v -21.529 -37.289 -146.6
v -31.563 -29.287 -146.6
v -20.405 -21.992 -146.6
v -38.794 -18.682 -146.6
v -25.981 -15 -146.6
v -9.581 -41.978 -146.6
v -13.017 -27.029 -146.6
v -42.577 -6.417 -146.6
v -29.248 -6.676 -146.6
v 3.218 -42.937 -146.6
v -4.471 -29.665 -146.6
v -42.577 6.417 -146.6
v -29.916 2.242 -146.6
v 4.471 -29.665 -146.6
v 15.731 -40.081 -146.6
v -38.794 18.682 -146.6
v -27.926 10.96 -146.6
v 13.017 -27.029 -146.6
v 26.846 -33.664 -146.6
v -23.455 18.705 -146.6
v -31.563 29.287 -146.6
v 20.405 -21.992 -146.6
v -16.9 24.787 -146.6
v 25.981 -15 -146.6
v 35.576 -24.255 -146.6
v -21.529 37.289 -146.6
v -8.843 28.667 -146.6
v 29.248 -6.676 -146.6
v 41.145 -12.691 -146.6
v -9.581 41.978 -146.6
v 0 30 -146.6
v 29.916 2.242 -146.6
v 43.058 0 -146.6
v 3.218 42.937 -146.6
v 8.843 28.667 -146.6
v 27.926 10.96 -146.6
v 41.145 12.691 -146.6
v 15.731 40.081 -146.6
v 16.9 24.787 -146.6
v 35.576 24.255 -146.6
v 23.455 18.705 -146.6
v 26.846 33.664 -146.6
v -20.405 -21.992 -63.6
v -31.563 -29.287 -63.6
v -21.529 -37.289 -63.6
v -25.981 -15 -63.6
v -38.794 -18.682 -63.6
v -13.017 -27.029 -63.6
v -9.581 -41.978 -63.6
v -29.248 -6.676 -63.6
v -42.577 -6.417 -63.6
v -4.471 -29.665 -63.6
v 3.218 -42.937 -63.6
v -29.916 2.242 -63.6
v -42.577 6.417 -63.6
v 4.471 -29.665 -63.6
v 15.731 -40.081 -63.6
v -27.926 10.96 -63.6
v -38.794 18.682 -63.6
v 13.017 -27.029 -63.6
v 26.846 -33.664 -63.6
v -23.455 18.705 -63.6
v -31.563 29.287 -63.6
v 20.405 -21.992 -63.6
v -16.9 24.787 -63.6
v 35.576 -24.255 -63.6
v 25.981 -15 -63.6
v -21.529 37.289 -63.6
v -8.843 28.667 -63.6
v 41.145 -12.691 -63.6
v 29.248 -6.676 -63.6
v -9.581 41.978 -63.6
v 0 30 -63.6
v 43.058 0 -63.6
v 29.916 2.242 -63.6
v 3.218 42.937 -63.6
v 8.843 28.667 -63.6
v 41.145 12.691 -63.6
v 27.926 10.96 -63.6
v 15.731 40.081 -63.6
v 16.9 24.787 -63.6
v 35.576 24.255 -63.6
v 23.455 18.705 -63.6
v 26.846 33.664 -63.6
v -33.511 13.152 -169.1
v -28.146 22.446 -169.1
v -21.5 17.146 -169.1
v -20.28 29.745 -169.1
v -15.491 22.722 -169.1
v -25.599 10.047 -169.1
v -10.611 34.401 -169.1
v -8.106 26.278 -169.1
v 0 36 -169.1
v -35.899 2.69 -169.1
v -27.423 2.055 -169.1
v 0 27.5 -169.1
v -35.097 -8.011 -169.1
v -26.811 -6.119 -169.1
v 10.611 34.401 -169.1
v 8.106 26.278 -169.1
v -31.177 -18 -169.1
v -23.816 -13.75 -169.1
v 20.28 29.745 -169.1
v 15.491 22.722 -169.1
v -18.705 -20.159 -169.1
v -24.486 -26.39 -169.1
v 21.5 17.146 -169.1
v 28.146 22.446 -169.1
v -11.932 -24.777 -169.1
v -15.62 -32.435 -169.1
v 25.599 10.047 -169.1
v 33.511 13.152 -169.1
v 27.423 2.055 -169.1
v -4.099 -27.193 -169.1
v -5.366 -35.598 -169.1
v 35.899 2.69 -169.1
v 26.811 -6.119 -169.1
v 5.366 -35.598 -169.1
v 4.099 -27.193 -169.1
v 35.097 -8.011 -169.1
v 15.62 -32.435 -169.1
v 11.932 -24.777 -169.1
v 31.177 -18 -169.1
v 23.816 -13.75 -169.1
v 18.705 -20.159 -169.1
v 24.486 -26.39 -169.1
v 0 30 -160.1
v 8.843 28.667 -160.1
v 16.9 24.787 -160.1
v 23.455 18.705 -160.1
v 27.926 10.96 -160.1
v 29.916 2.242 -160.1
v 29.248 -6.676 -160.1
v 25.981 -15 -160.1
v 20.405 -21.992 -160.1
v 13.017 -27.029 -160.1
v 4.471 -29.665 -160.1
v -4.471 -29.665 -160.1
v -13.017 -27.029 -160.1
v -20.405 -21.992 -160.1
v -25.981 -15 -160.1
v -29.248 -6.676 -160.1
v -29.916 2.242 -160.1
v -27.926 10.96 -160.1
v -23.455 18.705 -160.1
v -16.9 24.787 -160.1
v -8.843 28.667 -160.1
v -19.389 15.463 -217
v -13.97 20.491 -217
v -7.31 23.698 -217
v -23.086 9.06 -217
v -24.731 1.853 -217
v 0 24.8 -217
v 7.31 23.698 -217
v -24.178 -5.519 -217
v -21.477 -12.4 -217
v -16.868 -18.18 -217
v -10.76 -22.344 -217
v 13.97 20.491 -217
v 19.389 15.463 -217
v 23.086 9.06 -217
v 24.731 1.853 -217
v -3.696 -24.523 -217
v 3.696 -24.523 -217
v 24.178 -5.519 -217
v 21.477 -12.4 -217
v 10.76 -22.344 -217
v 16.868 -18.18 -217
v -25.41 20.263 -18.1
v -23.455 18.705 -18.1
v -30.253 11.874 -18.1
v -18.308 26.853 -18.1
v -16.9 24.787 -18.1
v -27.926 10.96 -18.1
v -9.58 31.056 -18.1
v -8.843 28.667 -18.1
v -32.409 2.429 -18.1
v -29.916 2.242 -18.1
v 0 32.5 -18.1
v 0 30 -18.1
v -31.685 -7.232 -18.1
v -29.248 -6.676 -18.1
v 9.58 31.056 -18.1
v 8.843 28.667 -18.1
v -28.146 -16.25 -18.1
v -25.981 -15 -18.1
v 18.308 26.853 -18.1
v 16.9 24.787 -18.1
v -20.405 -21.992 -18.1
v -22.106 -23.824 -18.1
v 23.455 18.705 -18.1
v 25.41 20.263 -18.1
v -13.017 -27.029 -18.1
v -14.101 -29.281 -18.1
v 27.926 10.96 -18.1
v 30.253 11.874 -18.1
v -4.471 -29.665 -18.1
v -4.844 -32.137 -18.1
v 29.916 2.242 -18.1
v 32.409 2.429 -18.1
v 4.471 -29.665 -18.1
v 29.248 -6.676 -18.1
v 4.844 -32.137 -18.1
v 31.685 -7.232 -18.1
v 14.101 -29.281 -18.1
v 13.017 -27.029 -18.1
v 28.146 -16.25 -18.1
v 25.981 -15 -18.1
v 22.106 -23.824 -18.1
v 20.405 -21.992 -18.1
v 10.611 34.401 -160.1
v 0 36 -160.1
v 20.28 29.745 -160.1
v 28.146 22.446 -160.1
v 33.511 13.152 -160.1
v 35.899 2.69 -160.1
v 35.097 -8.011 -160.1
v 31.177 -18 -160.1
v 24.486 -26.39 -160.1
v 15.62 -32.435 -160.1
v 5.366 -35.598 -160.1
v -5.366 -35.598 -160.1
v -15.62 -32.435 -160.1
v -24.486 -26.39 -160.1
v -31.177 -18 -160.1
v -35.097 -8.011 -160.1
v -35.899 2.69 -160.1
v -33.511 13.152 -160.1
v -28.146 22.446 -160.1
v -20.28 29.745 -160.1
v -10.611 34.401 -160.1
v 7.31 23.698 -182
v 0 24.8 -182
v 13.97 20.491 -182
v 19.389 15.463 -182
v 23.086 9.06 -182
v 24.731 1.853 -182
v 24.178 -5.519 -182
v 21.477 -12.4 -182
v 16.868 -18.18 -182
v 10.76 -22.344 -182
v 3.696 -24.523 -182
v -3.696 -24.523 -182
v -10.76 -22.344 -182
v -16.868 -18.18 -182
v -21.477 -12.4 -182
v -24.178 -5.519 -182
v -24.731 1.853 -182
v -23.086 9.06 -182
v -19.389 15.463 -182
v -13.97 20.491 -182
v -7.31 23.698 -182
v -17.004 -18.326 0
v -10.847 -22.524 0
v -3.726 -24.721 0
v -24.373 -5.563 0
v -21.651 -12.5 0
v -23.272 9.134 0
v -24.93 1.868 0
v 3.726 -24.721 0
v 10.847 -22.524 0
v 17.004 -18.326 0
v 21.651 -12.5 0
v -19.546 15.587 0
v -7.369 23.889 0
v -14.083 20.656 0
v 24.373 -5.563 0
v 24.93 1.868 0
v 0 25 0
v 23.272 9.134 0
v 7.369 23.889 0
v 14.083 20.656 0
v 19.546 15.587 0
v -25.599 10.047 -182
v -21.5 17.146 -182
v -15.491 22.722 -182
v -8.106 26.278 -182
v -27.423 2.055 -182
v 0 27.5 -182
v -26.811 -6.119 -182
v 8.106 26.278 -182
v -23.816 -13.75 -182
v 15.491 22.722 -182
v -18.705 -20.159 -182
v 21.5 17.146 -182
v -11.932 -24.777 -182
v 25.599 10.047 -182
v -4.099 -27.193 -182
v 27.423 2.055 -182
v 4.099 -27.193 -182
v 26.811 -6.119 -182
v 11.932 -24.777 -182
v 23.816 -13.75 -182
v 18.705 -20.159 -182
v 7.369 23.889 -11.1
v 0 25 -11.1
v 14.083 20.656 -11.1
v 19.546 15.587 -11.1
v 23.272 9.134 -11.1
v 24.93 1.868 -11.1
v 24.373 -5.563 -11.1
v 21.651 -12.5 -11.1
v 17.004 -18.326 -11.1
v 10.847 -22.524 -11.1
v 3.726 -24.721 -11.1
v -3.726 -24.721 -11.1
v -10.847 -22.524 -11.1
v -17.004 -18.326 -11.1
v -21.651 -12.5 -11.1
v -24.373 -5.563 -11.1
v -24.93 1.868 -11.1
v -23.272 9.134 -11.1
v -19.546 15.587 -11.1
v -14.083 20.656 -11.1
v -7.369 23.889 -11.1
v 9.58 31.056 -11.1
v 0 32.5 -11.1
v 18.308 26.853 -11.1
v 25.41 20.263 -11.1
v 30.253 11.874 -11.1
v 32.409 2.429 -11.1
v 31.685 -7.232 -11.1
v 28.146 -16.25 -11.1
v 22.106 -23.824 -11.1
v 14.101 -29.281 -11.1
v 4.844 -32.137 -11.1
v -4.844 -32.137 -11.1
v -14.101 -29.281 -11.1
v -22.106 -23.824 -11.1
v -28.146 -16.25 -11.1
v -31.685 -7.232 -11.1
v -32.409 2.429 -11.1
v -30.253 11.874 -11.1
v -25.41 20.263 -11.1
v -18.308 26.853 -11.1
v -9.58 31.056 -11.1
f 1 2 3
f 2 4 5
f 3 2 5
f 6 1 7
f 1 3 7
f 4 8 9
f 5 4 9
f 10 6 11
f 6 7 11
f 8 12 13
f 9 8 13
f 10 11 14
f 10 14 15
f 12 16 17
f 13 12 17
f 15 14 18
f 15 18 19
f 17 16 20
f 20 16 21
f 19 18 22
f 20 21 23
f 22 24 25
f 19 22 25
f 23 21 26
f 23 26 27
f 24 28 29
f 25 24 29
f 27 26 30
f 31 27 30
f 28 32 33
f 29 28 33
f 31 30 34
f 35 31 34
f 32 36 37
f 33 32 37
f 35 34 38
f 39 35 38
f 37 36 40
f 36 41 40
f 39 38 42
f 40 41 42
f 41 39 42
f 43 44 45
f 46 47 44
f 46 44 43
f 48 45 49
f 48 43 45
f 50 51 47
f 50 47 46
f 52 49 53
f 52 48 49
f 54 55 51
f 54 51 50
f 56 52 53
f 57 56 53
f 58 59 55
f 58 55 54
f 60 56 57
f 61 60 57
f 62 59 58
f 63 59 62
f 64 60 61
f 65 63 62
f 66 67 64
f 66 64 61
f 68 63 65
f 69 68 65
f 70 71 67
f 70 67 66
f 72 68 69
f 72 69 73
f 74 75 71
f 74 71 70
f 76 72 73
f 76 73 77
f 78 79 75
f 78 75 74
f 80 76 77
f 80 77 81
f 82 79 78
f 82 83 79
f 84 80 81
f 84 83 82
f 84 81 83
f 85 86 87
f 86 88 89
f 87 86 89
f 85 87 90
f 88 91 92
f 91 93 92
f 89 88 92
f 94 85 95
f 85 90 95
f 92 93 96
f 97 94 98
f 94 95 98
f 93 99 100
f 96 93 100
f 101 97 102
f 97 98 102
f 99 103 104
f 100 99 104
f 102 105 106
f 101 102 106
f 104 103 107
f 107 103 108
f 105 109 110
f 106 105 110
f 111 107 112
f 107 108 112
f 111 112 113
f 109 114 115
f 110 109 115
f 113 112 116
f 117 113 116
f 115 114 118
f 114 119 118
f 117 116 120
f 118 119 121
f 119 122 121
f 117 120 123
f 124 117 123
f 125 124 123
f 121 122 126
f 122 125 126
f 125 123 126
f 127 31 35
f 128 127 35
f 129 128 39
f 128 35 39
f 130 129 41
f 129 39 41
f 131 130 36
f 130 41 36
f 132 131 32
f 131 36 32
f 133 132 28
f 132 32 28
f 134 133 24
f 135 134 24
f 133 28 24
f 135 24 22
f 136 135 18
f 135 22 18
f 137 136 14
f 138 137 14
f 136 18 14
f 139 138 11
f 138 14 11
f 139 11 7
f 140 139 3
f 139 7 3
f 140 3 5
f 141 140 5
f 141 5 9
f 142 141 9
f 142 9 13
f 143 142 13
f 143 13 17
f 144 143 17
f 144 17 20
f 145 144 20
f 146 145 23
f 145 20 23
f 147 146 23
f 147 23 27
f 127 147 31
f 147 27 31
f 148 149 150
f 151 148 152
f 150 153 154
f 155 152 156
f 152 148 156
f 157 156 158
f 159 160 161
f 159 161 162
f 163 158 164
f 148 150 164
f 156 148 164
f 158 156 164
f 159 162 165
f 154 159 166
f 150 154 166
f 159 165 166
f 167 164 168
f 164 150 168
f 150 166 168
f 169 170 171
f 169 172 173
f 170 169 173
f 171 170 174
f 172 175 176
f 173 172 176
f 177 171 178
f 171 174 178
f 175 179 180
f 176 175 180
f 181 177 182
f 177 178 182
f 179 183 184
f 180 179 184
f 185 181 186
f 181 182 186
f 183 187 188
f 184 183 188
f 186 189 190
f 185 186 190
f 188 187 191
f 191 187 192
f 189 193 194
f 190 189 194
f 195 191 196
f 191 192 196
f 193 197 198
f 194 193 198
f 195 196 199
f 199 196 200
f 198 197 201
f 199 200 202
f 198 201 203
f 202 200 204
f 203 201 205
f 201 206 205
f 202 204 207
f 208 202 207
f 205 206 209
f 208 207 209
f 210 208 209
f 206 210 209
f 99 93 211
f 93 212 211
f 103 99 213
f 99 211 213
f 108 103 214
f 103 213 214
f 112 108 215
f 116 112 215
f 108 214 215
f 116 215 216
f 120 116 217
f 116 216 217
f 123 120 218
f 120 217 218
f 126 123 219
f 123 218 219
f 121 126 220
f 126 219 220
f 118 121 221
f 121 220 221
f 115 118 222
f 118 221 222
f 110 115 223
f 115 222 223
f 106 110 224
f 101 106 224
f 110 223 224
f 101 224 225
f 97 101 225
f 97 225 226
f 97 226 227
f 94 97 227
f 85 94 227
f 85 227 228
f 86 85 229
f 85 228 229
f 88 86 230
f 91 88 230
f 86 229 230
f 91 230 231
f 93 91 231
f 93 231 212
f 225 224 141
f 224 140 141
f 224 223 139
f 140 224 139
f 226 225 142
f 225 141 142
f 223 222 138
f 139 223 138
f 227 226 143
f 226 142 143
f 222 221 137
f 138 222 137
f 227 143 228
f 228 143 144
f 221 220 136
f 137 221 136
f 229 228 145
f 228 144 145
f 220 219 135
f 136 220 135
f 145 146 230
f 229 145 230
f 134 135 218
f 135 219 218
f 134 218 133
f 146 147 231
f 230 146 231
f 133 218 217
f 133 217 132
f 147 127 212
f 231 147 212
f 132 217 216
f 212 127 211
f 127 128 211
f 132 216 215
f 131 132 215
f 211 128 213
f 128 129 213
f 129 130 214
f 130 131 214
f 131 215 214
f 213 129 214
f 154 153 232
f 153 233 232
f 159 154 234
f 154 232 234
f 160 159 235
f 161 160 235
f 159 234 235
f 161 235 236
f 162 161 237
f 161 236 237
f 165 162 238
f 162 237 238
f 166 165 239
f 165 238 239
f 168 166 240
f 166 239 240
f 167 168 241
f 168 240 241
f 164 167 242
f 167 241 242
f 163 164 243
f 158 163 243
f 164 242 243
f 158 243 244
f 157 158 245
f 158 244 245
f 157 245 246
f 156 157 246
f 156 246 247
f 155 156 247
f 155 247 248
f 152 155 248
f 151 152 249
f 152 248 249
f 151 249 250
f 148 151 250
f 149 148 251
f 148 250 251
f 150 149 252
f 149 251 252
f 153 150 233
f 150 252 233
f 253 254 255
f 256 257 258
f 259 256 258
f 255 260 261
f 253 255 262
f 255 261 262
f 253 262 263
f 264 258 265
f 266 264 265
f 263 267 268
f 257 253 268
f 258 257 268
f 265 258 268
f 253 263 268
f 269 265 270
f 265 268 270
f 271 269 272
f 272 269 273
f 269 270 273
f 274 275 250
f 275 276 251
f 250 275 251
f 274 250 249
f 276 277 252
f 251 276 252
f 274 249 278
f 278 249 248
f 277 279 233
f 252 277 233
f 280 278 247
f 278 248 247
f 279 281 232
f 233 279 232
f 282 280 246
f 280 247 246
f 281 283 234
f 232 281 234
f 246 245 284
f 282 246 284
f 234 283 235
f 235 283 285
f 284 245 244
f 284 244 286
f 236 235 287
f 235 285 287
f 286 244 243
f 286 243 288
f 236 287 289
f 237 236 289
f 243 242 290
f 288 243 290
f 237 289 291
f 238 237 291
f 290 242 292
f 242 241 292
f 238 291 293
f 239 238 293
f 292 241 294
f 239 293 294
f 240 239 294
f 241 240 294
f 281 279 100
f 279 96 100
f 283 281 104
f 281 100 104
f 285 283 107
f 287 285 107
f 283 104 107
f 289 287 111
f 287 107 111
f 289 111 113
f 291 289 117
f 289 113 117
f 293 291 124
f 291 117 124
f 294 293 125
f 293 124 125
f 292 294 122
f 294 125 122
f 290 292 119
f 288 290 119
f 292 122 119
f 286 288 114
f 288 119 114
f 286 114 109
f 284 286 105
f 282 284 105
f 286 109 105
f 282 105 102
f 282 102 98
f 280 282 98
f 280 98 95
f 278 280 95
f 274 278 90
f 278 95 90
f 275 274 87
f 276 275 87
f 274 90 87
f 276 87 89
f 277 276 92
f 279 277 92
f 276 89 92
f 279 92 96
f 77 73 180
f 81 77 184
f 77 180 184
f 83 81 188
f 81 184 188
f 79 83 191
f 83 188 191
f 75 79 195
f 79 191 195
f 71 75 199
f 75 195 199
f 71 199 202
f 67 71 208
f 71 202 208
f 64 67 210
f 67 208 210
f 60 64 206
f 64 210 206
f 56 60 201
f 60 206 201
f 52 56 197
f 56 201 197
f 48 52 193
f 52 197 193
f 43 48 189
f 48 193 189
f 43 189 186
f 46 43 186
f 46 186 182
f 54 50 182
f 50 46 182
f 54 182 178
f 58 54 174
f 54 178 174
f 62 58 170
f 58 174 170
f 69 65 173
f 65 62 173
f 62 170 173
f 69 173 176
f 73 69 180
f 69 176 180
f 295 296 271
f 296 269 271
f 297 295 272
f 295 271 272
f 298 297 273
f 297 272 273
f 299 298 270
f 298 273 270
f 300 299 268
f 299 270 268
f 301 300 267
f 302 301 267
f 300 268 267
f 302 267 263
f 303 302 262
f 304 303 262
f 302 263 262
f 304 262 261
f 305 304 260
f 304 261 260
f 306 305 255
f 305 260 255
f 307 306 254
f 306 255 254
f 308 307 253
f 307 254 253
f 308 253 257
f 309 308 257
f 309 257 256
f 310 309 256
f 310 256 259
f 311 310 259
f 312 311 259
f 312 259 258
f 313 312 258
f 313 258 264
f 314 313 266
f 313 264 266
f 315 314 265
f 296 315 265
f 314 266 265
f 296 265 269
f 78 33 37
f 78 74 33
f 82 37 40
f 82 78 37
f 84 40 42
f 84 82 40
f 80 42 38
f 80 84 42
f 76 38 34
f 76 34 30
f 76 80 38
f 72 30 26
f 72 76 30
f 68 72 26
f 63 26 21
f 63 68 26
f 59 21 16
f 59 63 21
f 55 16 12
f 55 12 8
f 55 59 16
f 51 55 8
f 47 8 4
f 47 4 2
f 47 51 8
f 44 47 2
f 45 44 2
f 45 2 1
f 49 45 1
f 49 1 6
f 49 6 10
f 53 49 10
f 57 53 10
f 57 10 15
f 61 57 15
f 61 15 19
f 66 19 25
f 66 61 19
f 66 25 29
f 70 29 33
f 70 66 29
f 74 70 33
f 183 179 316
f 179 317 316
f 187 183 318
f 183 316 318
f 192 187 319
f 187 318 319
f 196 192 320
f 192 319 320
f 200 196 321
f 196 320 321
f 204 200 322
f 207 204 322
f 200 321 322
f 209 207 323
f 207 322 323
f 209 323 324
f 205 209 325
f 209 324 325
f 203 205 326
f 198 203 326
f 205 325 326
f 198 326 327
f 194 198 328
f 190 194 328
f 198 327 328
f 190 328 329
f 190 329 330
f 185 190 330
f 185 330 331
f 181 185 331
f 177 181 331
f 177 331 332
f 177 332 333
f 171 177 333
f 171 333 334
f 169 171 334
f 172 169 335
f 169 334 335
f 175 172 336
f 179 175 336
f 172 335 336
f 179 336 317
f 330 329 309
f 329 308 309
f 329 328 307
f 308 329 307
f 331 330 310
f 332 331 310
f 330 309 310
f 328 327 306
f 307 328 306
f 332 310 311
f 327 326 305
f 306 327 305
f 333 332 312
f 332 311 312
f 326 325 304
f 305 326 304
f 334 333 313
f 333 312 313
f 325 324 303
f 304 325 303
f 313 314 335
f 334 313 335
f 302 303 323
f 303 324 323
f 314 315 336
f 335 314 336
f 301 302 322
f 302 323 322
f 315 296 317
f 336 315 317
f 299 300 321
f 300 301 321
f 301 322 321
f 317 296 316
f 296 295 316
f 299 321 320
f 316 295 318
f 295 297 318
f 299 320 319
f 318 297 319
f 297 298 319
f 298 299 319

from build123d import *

# Parameters (mm, degrees)
SKETCH4_R           = 43.057541212
BOSS_EXTRUDE1_DEPTH = 41.5


with BuildPart() as part:
    # Sketch3 → Revolve1 (revolve)
    with BuildSketch(Plane(origin=(0, 0, 0), x_dir=(0, 0, -1), z_dir=(1, 0, 0))):
        Polygon((0, 0), (217, 0), (217, 24.8), (182, 24.8), (182, 27.500000118), (169.1, 27.500000118), (169.1, 36), (160.1, 36), (160.1, 30), (18.1, 30), (18.1, 32.5), (11.1, 32.5), (11.1, 25), (0, 25), align=None)
    revolve(axis=Axis((0, 0, 0), (0, 0, -1)))

    # Sketch4 → Boss-Extrude1 (add, symmetric)
    with BuildSketch(Plane.XY.offset(-105.1)):
        Circle(SKETCH4_R)
    extrude(amount=BOSS_EXTRUDE1_DEPTH, both=True)


solid = part.part
